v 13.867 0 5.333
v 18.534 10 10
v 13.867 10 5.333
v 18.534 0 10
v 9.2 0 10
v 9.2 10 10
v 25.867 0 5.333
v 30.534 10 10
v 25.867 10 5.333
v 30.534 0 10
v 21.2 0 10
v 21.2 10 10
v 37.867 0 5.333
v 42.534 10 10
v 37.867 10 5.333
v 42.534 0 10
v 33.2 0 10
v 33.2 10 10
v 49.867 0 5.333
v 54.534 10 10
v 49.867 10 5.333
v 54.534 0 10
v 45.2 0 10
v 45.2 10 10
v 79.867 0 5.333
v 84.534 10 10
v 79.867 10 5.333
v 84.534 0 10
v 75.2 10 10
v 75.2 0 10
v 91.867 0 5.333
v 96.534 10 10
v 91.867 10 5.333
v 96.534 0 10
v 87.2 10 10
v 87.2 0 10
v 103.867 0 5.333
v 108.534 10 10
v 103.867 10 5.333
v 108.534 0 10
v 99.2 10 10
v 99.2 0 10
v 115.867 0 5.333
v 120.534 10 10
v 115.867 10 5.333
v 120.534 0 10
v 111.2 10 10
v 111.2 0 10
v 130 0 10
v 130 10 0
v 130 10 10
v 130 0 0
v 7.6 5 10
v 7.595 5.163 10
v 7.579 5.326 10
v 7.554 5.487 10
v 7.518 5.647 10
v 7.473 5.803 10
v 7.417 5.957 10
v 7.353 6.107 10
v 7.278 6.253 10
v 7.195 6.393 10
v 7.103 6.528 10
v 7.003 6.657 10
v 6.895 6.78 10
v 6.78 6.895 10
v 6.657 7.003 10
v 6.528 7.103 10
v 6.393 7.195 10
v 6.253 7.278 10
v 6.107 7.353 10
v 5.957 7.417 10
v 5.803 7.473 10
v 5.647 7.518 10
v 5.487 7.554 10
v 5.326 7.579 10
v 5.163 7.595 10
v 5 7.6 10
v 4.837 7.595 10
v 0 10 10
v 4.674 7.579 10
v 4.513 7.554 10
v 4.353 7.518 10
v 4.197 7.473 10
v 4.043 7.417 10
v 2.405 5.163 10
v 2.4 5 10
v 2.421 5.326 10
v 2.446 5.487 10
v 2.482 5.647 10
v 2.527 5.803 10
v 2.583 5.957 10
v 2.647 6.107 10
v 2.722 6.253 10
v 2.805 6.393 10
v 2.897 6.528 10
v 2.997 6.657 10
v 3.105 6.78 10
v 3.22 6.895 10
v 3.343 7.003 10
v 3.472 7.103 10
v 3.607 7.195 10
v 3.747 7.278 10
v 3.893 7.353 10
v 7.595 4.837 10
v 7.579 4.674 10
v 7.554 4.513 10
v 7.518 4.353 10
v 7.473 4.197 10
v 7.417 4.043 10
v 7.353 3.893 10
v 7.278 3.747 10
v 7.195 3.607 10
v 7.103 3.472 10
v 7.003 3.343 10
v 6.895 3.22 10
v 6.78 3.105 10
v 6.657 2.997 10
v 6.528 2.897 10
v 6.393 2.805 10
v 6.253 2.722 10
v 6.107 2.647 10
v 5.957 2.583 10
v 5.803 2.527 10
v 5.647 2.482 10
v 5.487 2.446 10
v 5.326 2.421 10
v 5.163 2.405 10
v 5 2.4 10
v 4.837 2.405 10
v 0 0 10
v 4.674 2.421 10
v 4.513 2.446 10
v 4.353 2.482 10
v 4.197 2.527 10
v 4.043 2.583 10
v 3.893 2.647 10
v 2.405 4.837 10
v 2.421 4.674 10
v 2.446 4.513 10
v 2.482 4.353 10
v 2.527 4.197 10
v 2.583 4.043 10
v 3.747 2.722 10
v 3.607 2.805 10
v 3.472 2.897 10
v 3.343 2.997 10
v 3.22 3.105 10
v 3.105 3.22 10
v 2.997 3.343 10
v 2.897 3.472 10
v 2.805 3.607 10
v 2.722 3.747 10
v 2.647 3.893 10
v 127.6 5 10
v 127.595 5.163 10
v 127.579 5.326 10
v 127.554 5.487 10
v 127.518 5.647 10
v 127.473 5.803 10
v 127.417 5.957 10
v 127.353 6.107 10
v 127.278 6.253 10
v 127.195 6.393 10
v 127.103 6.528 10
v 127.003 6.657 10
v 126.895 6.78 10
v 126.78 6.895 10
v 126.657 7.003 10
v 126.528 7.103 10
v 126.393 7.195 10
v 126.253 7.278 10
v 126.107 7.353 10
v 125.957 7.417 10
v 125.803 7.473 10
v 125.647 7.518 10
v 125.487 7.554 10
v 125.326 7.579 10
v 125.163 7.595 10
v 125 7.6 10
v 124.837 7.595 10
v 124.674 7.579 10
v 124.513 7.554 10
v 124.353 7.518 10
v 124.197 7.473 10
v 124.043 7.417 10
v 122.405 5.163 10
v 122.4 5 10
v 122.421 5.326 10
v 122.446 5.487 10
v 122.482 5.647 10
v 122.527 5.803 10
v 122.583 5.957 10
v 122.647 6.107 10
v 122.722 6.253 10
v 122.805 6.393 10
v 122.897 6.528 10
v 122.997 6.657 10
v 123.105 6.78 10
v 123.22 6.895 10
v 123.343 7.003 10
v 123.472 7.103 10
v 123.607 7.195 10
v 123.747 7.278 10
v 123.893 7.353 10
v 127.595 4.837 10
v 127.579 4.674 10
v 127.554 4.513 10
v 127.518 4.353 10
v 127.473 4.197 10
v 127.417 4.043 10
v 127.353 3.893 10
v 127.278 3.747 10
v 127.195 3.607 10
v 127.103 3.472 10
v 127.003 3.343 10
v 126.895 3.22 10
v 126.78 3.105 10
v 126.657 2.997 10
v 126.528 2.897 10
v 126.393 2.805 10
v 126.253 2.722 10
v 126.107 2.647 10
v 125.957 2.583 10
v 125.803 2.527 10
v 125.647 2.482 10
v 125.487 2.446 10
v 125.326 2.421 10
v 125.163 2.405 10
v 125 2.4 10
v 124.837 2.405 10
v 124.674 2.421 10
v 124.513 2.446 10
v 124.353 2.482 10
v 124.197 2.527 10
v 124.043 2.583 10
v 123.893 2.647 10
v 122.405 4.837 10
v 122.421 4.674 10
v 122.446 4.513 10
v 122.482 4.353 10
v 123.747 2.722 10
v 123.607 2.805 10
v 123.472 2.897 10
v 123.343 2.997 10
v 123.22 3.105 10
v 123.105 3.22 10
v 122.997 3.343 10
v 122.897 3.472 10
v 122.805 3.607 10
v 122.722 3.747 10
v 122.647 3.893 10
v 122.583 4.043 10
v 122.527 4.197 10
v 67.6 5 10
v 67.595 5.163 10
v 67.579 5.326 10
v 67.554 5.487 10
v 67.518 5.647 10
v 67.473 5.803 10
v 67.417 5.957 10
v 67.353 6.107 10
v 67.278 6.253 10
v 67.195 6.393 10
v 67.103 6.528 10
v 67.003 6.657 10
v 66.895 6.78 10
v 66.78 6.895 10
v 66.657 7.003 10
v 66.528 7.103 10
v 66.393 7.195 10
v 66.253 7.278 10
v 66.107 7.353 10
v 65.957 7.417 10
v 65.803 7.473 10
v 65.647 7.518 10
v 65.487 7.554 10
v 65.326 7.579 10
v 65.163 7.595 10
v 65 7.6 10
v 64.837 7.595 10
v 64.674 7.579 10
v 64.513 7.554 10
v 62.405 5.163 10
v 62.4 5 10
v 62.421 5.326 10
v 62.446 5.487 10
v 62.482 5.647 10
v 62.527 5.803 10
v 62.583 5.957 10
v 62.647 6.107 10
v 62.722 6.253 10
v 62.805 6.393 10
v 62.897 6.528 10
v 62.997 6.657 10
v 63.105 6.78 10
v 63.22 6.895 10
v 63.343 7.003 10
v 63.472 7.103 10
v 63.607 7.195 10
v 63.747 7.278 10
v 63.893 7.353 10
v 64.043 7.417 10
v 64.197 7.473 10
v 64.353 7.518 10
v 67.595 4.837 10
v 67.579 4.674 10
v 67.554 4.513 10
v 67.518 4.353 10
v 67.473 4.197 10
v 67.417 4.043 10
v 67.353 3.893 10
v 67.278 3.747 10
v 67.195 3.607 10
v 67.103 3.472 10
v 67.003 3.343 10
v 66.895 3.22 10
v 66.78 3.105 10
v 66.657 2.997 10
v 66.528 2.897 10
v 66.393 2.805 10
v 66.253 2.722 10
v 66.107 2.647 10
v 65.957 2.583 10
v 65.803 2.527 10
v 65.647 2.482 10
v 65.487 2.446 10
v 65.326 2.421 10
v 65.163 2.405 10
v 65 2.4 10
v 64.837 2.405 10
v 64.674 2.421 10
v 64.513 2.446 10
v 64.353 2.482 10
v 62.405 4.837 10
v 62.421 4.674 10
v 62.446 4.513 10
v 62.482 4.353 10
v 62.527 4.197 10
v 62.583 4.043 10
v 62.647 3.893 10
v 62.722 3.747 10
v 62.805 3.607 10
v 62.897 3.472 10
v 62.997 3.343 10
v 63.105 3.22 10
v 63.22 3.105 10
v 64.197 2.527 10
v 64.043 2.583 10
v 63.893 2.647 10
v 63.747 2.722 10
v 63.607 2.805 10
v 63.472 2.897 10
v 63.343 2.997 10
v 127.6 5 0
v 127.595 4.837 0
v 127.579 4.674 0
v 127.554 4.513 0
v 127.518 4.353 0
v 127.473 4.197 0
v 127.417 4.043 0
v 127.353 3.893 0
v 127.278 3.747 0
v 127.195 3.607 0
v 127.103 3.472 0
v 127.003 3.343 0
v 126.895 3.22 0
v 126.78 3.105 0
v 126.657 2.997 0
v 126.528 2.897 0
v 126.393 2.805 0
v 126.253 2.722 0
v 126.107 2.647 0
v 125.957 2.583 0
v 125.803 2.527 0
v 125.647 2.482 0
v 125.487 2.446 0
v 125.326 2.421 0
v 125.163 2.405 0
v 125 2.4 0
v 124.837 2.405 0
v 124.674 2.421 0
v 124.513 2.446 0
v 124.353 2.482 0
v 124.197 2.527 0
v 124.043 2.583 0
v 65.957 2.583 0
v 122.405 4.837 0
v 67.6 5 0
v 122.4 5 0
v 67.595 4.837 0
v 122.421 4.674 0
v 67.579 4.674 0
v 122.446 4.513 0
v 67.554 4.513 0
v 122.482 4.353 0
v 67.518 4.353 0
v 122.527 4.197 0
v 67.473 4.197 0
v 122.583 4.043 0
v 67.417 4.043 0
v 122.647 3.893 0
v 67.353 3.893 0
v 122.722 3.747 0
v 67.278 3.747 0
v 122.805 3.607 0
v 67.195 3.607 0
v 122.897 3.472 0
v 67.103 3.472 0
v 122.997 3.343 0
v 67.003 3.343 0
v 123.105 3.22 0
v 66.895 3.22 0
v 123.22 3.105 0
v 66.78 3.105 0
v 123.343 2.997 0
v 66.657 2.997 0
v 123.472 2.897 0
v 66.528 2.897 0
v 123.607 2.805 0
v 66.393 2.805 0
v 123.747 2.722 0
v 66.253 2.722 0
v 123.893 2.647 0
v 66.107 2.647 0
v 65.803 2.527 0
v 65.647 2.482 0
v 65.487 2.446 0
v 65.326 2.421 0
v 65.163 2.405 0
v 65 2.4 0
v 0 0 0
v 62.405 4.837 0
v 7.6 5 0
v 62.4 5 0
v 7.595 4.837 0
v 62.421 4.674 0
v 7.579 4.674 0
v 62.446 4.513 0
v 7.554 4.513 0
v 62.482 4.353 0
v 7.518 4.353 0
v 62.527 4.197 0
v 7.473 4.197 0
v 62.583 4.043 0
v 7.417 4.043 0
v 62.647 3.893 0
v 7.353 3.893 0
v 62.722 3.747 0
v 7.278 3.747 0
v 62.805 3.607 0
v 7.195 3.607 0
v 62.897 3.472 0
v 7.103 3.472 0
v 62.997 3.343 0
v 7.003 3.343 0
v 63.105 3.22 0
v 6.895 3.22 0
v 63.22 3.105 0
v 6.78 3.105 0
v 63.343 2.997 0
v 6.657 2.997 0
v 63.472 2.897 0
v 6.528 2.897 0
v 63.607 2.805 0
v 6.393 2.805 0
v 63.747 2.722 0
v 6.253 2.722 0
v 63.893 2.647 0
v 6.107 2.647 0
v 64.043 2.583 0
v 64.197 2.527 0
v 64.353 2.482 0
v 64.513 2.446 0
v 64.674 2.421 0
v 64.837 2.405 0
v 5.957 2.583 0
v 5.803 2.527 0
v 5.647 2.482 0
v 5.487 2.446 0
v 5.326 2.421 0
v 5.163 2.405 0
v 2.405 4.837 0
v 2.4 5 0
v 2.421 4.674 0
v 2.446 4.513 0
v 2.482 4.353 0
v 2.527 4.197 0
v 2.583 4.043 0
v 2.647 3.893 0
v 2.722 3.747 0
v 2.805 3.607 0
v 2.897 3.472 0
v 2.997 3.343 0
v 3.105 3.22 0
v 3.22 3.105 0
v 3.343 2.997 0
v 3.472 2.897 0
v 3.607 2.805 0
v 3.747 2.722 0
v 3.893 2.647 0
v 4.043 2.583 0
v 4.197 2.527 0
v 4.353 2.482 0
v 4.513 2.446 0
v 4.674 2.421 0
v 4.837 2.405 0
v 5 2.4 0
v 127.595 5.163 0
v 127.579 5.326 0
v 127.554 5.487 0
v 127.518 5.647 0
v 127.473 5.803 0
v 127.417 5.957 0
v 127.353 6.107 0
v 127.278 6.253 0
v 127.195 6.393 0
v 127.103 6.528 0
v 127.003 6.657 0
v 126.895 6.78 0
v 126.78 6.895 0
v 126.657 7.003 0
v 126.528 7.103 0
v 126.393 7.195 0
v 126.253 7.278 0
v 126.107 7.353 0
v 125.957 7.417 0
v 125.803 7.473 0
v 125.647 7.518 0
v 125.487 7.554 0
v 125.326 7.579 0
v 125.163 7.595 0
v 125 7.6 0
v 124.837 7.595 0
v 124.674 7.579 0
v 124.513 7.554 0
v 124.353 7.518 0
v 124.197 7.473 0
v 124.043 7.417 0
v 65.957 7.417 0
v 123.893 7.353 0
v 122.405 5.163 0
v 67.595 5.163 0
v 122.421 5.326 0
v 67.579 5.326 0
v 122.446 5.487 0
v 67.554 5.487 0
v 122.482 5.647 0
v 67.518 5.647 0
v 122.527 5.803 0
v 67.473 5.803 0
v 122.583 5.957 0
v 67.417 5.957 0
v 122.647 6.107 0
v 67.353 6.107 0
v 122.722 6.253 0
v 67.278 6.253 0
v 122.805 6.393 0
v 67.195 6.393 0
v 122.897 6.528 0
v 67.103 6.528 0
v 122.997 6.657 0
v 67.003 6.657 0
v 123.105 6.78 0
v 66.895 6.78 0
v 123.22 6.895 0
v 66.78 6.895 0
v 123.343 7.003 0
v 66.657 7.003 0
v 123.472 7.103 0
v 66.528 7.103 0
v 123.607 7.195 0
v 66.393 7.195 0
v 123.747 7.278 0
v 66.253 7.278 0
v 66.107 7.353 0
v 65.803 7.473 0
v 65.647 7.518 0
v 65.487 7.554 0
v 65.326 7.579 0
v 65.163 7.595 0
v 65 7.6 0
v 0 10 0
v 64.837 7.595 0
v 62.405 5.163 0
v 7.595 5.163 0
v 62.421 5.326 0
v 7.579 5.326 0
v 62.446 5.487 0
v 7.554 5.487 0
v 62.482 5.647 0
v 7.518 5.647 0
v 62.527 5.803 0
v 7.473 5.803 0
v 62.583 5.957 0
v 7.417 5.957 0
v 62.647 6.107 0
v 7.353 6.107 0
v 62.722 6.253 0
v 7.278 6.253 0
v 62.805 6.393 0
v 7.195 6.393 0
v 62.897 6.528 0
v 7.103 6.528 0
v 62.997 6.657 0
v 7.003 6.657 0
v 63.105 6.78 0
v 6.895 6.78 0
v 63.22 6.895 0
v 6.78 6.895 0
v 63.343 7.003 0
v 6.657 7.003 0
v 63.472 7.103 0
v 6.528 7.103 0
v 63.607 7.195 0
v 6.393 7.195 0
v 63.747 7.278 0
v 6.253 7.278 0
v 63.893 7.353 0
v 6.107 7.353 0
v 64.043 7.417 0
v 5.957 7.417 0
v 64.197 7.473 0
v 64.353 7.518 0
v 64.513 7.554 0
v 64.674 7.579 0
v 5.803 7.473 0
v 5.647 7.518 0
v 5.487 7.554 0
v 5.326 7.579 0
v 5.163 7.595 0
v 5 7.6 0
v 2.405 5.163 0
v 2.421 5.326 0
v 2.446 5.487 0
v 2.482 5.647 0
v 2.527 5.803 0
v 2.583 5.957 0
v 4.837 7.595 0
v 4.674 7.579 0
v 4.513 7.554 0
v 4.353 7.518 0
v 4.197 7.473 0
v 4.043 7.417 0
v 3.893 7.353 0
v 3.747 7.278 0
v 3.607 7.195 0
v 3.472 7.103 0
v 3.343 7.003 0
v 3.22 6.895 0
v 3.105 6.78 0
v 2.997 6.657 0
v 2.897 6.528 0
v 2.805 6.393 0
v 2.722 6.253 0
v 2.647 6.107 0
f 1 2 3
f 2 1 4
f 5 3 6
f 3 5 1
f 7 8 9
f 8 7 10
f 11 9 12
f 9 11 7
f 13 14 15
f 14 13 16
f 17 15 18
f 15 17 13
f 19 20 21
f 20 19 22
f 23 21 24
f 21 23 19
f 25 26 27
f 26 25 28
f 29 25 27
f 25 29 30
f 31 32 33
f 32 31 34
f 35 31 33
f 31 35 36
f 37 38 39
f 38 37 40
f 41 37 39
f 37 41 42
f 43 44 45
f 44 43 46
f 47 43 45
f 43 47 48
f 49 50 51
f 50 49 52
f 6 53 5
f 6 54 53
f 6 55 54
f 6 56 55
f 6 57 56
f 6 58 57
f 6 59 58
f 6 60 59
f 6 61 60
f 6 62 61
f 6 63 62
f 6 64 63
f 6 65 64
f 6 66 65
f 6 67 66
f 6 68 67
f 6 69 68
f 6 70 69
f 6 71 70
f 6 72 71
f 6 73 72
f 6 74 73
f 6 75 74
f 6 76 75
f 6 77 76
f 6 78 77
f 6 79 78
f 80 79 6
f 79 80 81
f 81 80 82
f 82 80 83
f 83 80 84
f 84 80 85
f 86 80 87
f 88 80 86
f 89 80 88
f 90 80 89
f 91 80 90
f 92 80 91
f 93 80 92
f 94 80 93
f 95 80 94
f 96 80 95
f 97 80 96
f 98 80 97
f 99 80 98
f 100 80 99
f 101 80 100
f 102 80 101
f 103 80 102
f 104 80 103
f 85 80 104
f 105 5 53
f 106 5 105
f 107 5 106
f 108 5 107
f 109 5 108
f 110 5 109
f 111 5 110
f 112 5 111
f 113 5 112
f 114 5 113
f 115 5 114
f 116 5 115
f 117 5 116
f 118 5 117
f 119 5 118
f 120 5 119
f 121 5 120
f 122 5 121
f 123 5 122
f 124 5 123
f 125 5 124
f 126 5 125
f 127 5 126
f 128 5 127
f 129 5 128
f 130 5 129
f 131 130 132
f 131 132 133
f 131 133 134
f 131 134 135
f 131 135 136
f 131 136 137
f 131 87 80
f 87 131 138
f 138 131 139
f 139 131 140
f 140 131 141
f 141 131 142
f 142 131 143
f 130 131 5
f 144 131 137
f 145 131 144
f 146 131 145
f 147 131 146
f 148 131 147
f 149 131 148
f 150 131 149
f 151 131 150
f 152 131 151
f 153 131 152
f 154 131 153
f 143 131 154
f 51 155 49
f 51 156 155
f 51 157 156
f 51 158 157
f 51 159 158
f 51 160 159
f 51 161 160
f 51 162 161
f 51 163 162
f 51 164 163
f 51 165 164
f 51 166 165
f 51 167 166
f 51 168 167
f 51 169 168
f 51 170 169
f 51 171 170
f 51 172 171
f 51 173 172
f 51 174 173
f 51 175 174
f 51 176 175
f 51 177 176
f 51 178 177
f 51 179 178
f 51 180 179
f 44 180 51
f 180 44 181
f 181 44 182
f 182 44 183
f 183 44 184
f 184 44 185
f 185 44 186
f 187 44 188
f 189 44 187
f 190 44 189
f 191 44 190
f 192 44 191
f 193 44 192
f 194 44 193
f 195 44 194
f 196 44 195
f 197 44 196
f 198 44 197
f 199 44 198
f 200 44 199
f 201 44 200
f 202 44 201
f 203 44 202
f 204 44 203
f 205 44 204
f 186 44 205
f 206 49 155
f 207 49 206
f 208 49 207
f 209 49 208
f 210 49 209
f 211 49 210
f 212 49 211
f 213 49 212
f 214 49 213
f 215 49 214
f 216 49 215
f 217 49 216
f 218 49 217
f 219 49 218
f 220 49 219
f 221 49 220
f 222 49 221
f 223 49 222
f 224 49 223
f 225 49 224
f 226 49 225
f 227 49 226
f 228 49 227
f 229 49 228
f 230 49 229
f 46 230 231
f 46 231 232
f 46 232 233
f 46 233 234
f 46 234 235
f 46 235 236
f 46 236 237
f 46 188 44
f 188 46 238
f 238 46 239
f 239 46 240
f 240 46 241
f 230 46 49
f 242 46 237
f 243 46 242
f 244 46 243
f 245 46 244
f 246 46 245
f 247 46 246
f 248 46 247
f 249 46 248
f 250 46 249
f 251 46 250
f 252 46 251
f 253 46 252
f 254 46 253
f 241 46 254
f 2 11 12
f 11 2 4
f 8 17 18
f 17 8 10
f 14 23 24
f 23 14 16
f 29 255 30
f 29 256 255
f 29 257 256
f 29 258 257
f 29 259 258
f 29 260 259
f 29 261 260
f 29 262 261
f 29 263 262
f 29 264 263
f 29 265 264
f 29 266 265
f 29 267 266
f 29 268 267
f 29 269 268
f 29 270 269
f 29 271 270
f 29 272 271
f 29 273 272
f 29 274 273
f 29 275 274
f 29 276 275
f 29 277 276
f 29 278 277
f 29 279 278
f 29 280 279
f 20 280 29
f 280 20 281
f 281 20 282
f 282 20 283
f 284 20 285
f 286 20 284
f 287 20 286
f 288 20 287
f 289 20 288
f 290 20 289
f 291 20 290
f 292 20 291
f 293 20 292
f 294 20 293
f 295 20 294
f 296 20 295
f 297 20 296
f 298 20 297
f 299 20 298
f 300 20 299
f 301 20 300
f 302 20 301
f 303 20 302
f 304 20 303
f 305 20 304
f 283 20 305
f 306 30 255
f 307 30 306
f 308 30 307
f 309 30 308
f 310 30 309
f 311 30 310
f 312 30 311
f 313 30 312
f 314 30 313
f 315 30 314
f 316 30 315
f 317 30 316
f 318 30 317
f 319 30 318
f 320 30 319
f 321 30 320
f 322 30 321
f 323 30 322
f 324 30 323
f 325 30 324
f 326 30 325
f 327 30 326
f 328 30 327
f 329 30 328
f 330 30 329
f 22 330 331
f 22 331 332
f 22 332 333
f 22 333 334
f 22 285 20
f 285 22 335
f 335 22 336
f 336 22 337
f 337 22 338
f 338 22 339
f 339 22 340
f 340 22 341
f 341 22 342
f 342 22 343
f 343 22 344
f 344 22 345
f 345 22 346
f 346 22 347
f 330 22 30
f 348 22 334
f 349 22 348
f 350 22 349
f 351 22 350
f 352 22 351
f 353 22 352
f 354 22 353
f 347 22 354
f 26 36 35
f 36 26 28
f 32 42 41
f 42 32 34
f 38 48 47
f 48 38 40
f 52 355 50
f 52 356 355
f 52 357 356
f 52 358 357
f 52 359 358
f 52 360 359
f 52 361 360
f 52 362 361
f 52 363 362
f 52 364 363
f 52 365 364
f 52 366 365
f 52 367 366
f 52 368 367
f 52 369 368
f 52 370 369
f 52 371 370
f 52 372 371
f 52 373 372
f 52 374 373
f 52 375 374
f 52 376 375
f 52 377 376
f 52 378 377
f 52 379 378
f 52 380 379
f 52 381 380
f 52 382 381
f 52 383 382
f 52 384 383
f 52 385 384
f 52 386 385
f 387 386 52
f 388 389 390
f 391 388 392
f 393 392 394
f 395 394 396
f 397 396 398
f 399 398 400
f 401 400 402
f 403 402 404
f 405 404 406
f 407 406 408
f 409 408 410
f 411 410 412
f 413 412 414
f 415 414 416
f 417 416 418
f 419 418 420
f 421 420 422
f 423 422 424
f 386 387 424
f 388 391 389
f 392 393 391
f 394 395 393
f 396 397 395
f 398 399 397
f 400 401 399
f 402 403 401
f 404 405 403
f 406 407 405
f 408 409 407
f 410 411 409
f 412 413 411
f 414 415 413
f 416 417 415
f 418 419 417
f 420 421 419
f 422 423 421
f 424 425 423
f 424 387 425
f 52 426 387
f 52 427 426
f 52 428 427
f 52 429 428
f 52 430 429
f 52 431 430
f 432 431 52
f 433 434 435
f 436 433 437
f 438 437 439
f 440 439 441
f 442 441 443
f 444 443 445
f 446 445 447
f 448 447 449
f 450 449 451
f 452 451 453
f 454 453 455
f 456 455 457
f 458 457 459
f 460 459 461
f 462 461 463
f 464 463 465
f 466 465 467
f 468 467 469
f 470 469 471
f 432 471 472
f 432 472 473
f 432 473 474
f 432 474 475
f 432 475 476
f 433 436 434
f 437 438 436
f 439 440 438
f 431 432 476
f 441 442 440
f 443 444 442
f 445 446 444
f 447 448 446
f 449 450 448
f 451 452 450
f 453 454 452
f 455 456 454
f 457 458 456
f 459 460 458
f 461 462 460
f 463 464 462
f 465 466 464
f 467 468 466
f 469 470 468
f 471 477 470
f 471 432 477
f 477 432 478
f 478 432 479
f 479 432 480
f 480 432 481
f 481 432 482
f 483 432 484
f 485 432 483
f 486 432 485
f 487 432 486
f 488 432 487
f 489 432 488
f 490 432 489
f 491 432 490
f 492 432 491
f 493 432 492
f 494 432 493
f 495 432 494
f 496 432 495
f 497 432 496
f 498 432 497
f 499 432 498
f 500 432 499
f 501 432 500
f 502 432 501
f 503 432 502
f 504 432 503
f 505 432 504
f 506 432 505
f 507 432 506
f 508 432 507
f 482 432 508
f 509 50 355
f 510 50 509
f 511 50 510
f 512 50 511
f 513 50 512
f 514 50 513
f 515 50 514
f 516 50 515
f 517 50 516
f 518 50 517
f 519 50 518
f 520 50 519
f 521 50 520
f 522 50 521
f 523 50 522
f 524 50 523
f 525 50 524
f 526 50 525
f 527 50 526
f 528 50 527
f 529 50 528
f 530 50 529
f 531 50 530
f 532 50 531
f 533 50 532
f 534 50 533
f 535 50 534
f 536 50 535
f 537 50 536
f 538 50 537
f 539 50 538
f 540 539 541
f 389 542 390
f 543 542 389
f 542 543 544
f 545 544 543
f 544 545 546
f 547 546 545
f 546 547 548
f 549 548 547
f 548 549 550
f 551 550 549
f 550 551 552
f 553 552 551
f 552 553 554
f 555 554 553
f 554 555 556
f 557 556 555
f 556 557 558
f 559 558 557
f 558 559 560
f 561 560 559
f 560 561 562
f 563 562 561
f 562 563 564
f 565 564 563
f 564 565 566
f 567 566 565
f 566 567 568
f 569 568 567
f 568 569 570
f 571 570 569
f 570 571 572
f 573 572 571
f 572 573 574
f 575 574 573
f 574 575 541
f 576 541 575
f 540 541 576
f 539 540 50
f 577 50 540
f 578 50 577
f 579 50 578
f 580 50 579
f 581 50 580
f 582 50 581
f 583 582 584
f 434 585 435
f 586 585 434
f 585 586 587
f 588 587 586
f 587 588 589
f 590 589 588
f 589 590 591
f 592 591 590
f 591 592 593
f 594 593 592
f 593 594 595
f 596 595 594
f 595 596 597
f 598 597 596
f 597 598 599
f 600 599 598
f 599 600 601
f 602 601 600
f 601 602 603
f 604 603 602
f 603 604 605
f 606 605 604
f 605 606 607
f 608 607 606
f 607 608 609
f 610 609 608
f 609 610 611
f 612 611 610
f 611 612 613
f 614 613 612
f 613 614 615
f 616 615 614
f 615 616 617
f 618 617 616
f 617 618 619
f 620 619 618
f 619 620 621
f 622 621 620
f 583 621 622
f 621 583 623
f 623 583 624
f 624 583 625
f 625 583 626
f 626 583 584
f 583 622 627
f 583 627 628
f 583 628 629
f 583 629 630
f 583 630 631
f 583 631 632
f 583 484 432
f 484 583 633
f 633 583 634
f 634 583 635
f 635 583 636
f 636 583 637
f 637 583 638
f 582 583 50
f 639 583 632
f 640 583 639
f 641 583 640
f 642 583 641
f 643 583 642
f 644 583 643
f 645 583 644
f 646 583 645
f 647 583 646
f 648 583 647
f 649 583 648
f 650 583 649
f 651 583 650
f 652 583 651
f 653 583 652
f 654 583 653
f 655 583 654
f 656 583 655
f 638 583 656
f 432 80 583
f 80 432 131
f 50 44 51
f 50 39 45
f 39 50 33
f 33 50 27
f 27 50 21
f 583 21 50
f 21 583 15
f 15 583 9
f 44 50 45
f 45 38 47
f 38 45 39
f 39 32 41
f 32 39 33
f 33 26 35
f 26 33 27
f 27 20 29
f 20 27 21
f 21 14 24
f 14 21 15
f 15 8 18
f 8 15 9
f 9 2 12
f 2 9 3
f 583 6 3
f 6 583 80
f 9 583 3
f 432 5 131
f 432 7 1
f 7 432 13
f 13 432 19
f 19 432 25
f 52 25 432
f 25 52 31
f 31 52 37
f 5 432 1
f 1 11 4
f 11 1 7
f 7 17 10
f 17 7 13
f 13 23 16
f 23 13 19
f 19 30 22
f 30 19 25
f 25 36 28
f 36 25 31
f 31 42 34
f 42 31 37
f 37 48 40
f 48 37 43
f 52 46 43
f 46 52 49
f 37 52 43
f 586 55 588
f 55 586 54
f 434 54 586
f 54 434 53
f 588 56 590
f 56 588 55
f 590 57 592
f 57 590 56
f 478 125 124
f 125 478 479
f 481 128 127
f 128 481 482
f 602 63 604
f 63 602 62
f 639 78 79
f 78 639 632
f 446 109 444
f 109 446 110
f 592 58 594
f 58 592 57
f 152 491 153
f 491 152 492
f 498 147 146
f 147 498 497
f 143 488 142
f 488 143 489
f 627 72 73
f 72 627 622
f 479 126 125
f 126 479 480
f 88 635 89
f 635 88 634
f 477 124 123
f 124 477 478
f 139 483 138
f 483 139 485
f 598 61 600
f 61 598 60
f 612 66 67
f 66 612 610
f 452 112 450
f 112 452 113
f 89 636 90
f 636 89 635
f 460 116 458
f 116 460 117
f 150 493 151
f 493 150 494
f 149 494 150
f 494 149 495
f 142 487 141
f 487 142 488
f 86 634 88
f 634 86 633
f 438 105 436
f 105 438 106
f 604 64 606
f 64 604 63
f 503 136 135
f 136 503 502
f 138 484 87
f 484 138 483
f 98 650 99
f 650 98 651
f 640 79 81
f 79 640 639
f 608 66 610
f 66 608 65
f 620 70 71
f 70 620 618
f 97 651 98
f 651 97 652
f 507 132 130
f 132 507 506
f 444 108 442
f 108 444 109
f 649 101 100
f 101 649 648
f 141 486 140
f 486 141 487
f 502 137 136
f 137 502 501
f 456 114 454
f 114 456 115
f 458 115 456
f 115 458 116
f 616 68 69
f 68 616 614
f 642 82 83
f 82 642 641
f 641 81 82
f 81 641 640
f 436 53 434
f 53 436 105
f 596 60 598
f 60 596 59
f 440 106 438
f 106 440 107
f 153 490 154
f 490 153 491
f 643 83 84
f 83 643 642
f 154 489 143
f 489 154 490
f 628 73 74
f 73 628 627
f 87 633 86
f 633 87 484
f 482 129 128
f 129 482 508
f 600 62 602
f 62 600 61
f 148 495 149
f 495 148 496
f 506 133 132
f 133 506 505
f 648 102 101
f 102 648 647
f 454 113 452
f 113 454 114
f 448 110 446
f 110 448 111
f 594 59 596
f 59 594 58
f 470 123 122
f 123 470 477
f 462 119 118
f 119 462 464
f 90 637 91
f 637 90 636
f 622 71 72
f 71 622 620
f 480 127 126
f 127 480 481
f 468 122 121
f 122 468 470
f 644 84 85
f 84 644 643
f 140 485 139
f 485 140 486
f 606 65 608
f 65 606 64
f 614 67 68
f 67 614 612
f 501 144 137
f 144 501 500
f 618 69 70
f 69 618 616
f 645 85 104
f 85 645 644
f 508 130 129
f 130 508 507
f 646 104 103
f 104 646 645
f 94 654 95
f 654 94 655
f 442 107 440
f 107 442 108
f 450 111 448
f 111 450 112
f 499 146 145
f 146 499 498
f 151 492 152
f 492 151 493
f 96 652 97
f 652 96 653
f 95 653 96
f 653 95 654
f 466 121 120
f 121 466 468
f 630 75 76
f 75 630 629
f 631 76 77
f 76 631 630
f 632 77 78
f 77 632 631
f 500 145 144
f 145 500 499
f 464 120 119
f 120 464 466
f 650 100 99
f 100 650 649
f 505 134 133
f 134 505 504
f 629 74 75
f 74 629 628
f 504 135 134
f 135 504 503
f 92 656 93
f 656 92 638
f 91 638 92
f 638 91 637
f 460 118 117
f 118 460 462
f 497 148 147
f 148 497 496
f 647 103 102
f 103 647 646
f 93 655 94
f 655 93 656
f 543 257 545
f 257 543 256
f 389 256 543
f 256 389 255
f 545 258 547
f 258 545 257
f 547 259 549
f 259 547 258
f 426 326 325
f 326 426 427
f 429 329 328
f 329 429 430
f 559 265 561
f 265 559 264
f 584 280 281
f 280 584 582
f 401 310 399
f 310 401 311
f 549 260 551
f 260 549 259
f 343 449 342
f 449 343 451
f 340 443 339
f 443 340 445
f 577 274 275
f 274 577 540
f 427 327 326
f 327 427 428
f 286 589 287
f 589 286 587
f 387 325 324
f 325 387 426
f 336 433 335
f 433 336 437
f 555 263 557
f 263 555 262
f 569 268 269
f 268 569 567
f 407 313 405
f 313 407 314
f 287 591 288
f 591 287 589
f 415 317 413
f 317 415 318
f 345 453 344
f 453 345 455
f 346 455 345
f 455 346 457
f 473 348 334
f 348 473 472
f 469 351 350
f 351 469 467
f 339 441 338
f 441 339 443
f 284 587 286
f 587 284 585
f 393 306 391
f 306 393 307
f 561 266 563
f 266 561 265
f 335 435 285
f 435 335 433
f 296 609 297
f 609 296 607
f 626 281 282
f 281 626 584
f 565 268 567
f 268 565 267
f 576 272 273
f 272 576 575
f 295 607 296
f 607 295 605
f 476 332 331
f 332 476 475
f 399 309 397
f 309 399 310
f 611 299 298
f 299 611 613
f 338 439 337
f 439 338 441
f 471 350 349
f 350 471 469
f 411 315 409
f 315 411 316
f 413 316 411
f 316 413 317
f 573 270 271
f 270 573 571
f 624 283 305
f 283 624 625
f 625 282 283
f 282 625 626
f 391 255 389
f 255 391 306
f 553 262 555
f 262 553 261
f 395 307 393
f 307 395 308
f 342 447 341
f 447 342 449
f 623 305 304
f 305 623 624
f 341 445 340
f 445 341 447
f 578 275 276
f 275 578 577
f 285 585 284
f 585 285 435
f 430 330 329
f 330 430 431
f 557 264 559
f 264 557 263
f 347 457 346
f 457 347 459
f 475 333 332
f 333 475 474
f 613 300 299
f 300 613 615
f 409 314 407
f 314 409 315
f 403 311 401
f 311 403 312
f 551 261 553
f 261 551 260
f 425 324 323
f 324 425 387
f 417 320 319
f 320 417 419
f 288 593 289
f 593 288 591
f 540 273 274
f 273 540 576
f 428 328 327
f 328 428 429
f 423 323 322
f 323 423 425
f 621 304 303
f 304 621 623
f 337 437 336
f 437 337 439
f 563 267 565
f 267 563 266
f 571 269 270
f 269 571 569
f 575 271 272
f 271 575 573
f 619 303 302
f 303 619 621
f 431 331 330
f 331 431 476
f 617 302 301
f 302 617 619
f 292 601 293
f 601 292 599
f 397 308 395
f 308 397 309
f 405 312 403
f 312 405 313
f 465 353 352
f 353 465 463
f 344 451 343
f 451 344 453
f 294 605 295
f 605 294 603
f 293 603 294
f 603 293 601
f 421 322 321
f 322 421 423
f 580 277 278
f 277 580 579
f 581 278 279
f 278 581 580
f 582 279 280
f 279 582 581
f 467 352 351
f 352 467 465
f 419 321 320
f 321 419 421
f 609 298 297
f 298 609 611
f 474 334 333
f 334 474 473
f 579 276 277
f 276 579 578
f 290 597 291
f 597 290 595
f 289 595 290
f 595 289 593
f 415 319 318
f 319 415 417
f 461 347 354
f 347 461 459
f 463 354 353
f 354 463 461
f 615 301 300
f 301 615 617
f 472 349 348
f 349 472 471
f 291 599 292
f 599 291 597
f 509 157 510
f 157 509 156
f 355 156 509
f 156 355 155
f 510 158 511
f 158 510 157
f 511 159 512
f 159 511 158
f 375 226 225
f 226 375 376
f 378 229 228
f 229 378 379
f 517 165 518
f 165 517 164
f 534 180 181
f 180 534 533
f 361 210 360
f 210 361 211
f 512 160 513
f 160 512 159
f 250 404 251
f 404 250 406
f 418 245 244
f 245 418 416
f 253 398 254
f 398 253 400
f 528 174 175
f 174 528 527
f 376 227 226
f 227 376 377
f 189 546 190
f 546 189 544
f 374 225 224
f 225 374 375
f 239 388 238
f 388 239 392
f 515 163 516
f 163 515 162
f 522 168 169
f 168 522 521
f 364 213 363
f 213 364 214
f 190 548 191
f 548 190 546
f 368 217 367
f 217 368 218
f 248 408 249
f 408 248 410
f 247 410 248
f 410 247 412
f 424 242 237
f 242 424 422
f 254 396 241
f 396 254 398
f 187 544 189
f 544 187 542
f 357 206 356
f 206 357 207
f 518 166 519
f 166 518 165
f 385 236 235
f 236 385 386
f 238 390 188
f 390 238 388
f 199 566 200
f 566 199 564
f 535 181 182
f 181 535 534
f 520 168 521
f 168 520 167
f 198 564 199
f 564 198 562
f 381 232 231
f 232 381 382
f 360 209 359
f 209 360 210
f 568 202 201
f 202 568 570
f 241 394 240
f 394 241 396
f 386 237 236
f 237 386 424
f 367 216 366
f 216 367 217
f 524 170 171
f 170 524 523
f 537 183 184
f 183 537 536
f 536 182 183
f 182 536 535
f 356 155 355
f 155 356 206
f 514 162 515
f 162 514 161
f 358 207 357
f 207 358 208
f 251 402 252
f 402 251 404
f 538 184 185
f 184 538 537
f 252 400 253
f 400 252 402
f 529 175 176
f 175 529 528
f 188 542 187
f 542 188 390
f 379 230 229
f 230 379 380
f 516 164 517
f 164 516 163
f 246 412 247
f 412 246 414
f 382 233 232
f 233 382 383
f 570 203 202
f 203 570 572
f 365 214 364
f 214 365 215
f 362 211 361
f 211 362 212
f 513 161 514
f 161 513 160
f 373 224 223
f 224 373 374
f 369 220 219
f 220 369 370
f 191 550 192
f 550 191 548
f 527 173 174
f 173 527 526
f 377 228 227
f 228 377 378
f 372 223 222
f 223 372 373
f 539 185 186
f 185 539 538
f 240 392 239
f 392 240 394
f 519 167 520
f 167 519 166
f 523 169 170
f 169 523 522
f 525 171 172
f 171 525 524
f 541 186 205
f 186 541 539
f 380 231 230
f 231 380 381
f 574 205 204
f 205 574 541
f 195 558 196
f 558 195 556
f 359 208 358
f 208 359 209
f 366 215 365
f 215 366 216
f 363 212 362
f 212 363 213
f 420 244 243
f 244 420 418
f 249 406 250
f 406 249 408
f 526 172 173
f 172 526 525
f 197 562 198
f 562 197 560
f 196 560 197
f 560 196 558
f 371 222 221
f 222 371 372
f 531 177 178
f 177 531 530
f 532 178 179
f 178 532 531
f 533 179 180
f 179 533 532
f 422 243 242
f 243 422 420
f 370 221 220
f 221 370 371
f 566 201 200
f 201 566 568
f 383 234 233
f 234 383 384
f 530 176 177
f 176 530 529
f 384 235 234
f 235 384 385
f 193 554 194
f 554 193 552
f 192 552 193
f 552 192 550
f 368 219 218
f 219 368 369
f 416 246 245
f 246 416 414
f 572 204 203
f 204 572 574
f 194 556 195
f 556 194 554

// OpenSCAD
// file: functions.scad
/**********************************
	File: functions.scad
	Revision: 0.1 (10/7/2012)
	OpenSCAD version by:
	Michael Williams (gannon)
	mswillia@mtu.edu
**********************************/
include <config.scad>

//Drill a hole the given depth at the given location
module drill(x,y,radius,depth) {
	translate([x,y,-overdrill])
		cylinder(r=radius,h=depth,$fn=100);
}

module roundedcorner(radius,thickness,angle) {
	rotate([0,0,angle])
		translate([-radius+overdrill,-radius+overdrill,-overdrill])
			difference() {
				translate([-overdrill,-overdrill,0])
					cube([radius+overdrill,radius+overdrill,thickness+overdrill*2]);
				cylinder(r=radius,h=thickness+overdrill*2);
			}
}

//Usage: points is an array consisting of elements
//[x,y,r] for each point of the polygon
//Please note that x and y will be the centers
//of the rounded edges! Outside wall will be
//r away at some angle.
//Ideally I will make a function that will find
//the place to put the circle of a given radius
//based off of the points in the polygon.
module multiradiusroundedpoly(points,height) {
	linear_extrude(height=height)
		hull()
			for (p = points) {
				translate([p[0],p[1],0])
					circle(r=p[2],$fn=100);
			}
}
// file: config.scad
/**********************************
	File: config.scad
	Revision: 0.1 (10/7/2012)
	OpenSCAD version by:
	Michael Williams (gannon)
	mswillia@mtu.edu
**********************************/

/**********************************
		CONFIGURATION
**********************************/
//This is for the depth of holes so OpenSCAD renders correctly.
overdrill=0.1;

//Eventually group configurations into here. Maybe auto config for metric vs SAE components?

/**********************************
		END CONFIGURATION
**********************************/
// main file
/**********************************
	File: elextronicscablestrainrelief.scad
	Revision: 0.2 (10/7/2012)
	OpenSCAD version by:
	Michael Williams (gannon)
	mswillia@mtu.edu
**********************************/
include <config.scad>
use <functions.scad>
/**********************************
		CONFIGURATION
**********************************/
//Base size
width=130;
height=10;
thickness=10;

//Holes
radius=2.6;

/**********************************
		END CONFIGURATION
**********************************/

difference() {
	//Make our base unit
	cube([width,height,thickness]);

	//Drill the hole
	drill(5,height/2,radius,thickness+overdrill*2);
	drill(width/2,height/2,radius,thickness+overdrill*2);
	drill(width-5,height/2,radius,thickness+overdrill*2);

	//Make the strain reliefs
	translate([9.2,-overdrill,0])
		strain_relief();
	translate([75.2,-overdrill,0])
		strain_relief();
}

module strain_relief() {
	union() {
		translate([0,0,thickness])
			rotate([0,45,0])
				cube([6.6,height+overdrill*2,6.6]);
		translate([12,0,thickness])
			rotate([0,45,0])
				cube([6.6,height+overdrill*2,6.6]);
		translate([24,0,thickness])
			rotate([0,45,0])
				cube([6.6,height+overdrill*2,6.6]);
		translate([36,0,thickness])
			rotate([0,45,0])
				cube([6.6,height+overdrill*2,6.6]);
	}
}
